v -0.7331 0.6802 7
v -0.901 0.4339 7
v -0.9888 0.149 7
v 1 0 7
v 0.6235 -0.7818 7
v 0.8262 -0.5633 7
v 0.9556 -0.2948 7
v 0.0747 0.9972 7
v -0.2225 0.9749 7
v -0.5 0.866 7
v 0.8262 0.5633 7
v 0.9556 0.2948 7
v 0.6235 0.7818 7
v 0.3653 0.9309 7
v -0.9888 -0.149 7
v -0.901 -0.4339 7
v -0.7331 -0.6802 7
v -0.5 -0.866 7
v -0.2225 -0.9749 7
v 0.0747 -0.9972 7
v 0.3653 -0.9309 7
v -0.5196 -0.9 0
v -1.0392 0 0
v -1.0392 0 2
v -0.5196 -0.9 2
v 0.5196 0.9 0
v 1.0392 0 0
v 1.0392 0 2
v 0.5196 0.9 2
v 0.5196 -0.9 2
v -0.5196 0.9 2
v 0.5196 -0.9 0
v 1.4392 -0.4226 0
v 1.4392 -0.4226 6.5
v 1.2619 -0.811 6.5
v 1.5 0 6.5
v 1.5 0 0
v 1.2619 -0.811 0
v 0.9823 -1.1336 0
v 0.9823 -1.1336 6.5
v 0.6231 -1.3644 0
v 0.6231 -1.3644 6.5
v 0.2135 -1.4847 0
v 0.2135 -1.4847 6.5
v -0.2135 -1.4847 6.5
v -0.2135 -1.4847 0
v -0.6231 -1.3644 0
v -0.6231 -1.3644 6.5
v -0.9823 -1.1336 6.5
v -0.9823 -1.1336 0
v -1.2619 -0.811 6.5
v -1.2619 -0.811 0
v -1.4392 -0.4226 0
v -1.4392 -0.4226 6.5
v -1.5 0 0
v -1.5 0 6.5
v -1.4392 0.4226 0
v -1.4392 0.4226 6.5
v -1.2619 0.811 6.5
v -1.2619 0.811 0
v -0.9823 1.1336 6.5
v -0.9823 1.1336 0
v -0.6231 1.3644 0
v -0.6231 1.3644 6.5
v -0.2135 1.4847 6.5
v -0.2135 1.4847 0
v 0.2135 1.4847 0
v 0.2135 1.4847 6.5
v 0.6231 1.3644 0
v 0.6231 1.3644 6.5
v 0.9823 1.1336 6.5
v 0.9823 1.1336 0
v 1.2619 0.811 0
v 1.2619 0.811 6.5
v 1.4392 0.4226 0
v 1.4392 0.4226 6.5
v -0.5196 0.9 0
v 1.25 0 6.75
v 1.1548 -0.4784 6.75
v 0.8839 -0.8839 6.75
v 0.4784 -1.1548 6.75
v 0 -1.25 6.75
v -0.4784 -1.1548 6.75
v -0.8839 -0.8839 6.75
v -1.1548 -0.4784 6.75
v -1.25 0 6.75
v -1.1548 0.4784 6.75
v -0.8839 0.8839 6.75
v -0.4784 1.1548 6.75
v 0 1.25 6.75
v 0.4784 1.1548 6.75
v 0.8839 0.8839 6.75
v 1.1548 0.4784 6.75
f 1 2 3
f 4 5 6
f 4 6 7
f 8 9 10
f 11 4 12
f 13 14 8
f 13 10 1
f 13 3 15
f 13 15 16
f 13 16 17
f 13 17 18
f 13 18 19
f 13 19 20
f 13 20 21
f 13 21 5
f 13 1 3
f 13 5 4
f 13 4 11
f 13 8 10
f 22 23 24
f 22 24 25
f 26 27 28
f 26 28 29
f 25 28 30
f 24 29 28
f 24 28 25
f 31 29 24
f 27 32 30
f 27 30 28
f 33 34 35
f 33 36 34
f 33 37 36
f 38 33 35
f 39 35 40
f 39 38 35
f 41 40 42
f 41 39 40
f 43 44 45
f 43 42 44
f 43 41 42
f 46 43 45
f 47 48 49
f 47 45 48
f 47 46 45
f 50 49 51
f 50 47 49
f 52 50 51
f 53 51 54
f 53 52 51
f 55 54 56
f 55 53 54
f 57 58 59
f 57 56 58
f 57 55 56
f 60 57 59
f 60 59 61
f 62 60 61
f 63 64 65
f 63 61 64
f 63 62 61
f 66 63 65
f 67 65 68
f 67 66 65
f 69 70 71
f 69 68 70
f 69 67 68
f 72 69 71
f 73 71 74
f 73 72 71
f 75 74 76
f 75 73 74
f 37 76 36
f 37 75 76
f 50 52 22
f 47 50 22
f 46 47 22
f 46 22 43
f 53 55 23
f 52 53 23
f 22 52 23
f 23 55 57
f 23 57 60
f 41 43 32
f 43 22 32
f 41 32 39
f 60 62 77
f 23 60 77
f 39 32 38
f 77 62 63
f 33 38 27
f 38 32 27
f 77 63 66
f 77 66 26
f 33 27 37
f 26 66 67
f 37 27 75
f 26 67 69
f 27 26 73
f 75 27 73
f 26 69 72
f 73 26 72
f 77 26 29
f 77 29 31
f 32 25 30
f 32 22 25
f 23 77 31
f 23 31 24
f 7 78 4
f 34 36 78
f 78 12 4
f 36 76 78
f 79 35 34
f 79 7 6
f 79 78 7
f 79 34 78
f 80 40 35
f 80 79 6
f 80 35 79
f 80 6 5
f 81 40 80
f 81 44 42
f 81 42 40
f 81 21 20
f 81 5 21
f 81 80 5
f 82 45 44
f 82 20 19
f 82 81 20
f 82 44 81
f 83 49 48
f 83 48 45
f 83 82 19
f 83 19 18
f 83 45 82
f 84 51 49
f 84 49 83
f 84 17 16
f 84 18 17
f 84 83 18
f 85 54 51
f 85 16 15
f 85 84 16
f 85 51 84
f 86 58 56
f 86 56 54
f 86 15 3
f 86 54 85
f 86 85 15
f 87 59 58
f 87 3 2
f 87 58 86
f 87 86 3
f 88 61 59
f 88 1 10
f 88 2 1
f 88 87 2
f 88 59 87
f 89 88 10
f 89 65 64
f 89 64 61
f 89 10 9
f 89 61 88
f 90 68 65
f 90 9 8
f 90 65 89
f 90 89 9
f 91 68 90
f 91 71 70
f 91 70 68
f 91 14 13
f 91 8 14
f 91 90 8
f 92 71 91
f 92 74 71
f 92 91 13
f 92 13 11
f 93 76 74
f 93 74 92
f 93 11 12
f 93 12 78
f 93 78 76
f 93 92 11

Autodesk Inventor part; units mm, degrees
ref_plane "YZ Plane" through (0, 0, 0) normal (1, 0, 0) x (0, 1, 0)
ref_plane "XZ Plane" through (0, 0, 0) normal (0, 1, 0) x (-1, 0, 0)
ref_plane "XY Plane" through (0, 0, 0) normal (0, 0, 1) x (1, 0, 0)
sketch "Sketch1" plane through (0, 0, 0) normal (0, 0, 1) x (1, 0, 0)
  circle A0 centre (0, 0) radius 1.5
  dimension "d0" = 3
extrude "Extrusion1" add sketch "Sketch1" along normal blind 7
chamfer "Chamfer1" distance 0.5 angle 45 1 edges at (-1.5, 0, 7)
sketch "Sketch2" plane through (0, 0, 0) normal (0, 0, -1) x (-1, 0, 0)
  line L0 (-0.5196, 0.9) -> (0.5196, 0.9)
  line L1 (0.5196, 0.9) -> (1.0392, 0)
  line L2 (1.0392, 0) -> (0.5196, -0.9)
  line L3 (0.5196, -0.9) -> (-0.5196, -0.9)
  line L4 (-0.5196, -0.9) -> (-1.0392, 0)
  line L5 (-1.0392, 0) -> (-0.5196, 0.9)
  point P0 (0, 0)
  point P1 (0, 0)
  dimension "d6" = 1.8
extrude "Extrusion2" cut sketch "Sketch2" against normal blind 2
properties part number "m3_setscrew"
